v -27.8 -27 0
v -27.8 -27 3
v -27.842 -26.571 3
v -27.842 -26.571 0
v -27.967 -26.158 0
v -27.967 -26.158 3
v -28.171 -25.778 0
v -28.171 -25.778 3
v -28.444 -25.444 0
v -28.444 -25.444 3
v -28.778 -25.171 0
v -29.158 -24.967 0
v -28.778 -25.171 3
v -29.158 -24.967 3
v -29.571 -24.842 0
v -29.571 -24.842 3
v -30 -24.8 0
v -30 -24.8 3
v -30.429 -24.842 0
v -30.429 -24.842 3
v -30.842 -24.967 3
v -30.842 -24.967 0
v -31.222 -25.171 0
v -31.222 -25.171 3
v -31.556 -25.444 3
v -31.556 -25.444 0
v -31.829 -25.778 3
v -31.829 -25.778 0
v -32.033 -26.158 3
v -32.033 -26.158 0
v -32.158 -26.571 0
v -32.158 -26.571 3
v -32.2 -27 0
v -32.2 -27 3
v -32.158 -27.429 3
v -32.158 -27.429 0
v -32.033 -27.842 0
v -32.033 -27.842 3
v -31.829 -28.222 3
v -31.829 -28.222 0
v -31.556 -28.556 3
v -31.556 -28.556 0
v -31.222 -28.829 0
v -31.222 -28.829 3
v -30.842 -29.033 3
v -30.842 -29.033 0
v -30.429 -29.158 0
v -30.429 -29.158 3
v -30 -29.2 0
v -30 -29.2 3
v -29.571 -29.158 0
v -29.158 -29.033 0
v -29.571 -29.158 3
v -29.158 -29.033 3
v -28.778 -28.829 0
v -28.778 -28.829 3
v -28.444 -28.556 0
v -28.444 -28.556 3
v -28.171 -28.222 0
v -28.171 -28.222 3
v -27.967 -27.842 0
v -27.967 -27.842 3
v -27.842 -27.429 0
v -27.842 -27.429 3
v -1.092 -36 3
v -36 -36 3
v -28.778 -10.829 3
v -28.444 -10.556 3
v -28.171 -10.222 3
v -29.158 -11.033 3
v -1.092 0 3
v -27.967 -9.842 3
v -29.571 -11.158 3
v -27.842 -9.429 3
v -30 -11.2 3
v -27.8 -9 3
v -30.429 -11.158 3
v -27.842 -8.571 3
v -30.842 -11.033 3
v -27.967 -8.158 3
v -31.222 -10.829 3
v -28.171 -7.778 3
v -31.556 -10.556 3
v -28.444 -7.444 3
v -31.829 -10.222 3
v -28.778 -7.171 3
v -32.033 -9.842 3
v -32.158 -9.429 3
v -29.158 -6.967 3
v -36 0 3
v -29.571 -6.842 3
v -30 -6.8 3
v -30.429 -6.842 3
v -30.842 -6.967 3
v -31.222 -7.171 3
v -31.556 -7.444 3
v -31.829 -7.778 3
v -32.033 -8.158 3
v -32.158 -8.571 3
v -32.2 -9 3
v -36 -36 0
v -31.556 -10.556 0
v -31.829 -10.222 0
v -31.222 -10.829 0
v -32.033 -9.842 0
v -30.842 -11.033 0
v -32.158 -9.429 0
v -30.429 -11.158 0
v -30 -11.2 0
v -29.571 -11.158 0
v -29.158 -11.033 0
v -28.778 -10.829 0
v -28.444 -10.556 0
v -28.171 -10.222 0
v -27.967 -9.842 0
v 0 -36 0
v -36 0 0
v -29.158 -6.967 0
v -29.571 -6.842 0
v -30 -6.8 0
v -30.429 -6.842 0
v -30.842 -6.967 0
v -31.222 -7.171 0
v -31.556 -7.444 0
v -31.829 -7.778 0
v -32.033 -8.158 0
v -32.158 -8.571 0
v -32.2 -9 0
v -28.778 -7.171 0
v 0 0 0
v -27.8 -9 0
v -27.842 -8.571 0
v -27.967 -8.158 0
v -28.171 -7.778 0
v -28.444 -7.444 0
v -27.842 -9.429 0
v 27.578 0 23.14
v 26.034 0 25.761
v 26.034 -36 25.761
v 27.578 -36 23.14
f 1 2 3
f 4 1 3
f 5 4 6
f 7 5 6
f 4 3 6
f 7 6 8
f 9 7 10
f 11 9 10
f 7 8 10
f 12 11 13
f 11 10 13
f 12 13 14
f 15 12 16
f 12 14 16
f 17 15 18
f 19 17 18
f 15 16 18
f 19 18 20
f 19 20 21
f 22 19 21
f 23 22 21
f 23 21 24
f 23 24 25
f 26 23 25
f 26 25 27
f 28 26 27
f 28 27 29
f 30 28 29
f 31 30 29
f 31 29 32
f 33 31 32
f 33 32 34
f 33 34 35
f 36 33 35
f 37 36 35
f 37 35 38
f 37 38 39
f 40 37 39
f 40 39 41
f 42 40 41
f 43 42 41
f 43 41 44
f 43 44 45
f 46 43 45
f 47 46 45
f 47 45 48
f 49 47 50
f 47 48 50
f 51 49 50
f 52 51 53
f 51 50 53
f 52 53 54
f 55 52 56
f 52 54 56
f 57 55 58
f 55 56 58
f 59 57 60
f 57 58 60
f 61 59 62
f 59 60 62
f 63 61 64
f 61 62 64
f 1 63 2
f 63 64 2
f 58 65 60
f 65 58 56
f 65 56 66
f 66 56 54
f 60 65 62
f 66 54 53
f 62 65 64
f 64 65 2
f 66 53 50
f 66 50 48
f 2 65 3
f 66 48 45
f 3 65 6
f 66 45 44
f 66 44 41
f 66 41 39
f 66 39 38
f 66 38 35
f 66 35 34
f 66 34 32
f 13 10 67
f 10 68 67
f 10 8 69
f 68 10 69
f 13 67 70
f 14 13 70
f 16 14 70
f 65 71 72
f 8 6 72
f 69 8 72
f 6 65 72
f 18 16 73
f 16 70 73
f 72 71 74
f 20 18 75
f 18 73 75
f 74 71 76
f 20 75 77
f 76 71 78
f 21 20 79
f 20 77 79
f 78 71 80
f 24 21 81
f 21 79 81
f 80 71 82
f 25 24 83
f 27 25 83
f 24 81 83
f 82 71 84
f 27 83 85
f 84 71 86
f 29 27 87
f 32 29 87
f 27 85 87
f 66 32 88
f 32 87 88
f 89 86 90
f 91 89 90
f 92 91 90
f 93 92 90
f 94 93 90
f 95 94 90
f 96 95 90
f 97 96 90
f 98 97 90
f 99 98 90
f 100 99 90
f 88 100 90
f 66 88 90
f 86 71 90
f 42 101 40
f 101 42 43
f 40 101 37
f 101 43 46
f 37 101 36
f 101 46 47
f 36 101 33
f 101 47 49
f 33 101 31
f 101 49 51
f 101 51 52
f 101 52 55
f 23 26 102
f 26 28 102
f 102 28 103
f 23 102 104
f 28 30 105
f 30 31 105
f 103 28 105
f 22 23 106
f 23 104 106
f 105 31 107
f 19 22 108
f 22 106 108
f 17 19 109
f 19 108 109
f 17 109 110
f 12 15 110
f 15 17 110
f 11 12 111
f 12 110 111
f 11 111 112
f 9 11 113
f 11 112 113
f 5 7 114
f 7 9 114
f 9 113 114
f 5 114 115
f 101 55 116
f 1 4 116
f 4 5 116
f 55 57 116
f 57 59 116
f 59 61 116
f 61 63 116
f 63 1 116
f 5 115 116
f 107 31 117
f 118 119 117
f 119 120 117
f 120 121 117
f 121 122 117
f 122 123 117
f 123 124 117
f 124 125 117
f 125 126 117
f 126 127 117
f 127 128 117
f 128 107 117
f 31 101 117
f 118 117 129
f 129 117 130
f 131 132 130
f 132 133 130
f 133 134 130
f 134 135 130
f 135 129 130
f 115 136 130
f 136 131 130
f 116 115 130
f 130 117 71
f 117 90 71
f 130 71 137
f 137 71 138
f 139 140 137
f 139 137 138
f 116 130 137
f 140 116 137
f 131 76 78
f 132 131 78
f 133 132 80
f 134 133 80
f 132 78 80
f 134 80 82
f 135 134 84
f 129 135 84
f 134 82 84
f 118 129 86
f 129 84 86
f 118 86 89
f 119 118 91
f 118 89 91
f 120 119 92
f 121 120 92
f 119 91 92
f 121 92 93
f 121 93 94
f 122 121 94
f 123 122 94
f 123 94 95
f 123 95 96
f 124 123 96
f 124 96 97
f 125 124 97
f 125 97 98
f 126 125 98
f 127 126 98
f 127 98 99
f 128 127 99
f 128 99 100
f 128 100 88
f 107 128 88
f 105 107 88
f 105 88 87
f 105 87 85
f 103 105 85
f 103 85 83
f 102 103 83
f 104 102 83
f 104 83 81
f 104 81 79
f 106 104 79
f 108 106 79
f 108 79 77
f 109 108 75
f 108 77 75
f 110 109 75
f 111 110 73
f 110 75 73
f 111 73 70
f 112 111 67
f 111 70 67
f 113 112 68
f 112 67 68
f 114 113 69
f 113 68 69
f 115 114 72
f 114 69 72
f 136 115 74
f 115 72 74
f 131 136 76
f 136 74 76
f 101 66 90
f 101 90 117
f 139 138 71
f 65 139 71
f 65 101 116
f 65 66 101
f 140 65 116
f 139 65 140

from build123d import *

# Parameters (mm, degrees)
F1_DEPTH = 36
F2_R     = 2.2
F3_DEPTH = 3.001


with BuildPart() as f1:
    # F0 (on Front) → F1 (new body)
    with BuildSketch(Plane.XZ):
        Polygon((-36, 0), (0, 0), (27.5776, 23.140354), (26.033813, 25.761185), (-1.091911, 3), (-36, 3), align=None)
    extrude(amount=F1_DEPTH)

    # F2 (on face) → F3 (cut, through all)
    with BuildSketch(Plane.XY.offset(3)):
        with Locations((-30, -9)):
            Circle(F2_R)
        with Locations((-30, -27)):
            Circle(F2_R)
    extrude(amount=-F3_DEPTH, mode=Mode.SUBTRACT)


solid = f1.part
